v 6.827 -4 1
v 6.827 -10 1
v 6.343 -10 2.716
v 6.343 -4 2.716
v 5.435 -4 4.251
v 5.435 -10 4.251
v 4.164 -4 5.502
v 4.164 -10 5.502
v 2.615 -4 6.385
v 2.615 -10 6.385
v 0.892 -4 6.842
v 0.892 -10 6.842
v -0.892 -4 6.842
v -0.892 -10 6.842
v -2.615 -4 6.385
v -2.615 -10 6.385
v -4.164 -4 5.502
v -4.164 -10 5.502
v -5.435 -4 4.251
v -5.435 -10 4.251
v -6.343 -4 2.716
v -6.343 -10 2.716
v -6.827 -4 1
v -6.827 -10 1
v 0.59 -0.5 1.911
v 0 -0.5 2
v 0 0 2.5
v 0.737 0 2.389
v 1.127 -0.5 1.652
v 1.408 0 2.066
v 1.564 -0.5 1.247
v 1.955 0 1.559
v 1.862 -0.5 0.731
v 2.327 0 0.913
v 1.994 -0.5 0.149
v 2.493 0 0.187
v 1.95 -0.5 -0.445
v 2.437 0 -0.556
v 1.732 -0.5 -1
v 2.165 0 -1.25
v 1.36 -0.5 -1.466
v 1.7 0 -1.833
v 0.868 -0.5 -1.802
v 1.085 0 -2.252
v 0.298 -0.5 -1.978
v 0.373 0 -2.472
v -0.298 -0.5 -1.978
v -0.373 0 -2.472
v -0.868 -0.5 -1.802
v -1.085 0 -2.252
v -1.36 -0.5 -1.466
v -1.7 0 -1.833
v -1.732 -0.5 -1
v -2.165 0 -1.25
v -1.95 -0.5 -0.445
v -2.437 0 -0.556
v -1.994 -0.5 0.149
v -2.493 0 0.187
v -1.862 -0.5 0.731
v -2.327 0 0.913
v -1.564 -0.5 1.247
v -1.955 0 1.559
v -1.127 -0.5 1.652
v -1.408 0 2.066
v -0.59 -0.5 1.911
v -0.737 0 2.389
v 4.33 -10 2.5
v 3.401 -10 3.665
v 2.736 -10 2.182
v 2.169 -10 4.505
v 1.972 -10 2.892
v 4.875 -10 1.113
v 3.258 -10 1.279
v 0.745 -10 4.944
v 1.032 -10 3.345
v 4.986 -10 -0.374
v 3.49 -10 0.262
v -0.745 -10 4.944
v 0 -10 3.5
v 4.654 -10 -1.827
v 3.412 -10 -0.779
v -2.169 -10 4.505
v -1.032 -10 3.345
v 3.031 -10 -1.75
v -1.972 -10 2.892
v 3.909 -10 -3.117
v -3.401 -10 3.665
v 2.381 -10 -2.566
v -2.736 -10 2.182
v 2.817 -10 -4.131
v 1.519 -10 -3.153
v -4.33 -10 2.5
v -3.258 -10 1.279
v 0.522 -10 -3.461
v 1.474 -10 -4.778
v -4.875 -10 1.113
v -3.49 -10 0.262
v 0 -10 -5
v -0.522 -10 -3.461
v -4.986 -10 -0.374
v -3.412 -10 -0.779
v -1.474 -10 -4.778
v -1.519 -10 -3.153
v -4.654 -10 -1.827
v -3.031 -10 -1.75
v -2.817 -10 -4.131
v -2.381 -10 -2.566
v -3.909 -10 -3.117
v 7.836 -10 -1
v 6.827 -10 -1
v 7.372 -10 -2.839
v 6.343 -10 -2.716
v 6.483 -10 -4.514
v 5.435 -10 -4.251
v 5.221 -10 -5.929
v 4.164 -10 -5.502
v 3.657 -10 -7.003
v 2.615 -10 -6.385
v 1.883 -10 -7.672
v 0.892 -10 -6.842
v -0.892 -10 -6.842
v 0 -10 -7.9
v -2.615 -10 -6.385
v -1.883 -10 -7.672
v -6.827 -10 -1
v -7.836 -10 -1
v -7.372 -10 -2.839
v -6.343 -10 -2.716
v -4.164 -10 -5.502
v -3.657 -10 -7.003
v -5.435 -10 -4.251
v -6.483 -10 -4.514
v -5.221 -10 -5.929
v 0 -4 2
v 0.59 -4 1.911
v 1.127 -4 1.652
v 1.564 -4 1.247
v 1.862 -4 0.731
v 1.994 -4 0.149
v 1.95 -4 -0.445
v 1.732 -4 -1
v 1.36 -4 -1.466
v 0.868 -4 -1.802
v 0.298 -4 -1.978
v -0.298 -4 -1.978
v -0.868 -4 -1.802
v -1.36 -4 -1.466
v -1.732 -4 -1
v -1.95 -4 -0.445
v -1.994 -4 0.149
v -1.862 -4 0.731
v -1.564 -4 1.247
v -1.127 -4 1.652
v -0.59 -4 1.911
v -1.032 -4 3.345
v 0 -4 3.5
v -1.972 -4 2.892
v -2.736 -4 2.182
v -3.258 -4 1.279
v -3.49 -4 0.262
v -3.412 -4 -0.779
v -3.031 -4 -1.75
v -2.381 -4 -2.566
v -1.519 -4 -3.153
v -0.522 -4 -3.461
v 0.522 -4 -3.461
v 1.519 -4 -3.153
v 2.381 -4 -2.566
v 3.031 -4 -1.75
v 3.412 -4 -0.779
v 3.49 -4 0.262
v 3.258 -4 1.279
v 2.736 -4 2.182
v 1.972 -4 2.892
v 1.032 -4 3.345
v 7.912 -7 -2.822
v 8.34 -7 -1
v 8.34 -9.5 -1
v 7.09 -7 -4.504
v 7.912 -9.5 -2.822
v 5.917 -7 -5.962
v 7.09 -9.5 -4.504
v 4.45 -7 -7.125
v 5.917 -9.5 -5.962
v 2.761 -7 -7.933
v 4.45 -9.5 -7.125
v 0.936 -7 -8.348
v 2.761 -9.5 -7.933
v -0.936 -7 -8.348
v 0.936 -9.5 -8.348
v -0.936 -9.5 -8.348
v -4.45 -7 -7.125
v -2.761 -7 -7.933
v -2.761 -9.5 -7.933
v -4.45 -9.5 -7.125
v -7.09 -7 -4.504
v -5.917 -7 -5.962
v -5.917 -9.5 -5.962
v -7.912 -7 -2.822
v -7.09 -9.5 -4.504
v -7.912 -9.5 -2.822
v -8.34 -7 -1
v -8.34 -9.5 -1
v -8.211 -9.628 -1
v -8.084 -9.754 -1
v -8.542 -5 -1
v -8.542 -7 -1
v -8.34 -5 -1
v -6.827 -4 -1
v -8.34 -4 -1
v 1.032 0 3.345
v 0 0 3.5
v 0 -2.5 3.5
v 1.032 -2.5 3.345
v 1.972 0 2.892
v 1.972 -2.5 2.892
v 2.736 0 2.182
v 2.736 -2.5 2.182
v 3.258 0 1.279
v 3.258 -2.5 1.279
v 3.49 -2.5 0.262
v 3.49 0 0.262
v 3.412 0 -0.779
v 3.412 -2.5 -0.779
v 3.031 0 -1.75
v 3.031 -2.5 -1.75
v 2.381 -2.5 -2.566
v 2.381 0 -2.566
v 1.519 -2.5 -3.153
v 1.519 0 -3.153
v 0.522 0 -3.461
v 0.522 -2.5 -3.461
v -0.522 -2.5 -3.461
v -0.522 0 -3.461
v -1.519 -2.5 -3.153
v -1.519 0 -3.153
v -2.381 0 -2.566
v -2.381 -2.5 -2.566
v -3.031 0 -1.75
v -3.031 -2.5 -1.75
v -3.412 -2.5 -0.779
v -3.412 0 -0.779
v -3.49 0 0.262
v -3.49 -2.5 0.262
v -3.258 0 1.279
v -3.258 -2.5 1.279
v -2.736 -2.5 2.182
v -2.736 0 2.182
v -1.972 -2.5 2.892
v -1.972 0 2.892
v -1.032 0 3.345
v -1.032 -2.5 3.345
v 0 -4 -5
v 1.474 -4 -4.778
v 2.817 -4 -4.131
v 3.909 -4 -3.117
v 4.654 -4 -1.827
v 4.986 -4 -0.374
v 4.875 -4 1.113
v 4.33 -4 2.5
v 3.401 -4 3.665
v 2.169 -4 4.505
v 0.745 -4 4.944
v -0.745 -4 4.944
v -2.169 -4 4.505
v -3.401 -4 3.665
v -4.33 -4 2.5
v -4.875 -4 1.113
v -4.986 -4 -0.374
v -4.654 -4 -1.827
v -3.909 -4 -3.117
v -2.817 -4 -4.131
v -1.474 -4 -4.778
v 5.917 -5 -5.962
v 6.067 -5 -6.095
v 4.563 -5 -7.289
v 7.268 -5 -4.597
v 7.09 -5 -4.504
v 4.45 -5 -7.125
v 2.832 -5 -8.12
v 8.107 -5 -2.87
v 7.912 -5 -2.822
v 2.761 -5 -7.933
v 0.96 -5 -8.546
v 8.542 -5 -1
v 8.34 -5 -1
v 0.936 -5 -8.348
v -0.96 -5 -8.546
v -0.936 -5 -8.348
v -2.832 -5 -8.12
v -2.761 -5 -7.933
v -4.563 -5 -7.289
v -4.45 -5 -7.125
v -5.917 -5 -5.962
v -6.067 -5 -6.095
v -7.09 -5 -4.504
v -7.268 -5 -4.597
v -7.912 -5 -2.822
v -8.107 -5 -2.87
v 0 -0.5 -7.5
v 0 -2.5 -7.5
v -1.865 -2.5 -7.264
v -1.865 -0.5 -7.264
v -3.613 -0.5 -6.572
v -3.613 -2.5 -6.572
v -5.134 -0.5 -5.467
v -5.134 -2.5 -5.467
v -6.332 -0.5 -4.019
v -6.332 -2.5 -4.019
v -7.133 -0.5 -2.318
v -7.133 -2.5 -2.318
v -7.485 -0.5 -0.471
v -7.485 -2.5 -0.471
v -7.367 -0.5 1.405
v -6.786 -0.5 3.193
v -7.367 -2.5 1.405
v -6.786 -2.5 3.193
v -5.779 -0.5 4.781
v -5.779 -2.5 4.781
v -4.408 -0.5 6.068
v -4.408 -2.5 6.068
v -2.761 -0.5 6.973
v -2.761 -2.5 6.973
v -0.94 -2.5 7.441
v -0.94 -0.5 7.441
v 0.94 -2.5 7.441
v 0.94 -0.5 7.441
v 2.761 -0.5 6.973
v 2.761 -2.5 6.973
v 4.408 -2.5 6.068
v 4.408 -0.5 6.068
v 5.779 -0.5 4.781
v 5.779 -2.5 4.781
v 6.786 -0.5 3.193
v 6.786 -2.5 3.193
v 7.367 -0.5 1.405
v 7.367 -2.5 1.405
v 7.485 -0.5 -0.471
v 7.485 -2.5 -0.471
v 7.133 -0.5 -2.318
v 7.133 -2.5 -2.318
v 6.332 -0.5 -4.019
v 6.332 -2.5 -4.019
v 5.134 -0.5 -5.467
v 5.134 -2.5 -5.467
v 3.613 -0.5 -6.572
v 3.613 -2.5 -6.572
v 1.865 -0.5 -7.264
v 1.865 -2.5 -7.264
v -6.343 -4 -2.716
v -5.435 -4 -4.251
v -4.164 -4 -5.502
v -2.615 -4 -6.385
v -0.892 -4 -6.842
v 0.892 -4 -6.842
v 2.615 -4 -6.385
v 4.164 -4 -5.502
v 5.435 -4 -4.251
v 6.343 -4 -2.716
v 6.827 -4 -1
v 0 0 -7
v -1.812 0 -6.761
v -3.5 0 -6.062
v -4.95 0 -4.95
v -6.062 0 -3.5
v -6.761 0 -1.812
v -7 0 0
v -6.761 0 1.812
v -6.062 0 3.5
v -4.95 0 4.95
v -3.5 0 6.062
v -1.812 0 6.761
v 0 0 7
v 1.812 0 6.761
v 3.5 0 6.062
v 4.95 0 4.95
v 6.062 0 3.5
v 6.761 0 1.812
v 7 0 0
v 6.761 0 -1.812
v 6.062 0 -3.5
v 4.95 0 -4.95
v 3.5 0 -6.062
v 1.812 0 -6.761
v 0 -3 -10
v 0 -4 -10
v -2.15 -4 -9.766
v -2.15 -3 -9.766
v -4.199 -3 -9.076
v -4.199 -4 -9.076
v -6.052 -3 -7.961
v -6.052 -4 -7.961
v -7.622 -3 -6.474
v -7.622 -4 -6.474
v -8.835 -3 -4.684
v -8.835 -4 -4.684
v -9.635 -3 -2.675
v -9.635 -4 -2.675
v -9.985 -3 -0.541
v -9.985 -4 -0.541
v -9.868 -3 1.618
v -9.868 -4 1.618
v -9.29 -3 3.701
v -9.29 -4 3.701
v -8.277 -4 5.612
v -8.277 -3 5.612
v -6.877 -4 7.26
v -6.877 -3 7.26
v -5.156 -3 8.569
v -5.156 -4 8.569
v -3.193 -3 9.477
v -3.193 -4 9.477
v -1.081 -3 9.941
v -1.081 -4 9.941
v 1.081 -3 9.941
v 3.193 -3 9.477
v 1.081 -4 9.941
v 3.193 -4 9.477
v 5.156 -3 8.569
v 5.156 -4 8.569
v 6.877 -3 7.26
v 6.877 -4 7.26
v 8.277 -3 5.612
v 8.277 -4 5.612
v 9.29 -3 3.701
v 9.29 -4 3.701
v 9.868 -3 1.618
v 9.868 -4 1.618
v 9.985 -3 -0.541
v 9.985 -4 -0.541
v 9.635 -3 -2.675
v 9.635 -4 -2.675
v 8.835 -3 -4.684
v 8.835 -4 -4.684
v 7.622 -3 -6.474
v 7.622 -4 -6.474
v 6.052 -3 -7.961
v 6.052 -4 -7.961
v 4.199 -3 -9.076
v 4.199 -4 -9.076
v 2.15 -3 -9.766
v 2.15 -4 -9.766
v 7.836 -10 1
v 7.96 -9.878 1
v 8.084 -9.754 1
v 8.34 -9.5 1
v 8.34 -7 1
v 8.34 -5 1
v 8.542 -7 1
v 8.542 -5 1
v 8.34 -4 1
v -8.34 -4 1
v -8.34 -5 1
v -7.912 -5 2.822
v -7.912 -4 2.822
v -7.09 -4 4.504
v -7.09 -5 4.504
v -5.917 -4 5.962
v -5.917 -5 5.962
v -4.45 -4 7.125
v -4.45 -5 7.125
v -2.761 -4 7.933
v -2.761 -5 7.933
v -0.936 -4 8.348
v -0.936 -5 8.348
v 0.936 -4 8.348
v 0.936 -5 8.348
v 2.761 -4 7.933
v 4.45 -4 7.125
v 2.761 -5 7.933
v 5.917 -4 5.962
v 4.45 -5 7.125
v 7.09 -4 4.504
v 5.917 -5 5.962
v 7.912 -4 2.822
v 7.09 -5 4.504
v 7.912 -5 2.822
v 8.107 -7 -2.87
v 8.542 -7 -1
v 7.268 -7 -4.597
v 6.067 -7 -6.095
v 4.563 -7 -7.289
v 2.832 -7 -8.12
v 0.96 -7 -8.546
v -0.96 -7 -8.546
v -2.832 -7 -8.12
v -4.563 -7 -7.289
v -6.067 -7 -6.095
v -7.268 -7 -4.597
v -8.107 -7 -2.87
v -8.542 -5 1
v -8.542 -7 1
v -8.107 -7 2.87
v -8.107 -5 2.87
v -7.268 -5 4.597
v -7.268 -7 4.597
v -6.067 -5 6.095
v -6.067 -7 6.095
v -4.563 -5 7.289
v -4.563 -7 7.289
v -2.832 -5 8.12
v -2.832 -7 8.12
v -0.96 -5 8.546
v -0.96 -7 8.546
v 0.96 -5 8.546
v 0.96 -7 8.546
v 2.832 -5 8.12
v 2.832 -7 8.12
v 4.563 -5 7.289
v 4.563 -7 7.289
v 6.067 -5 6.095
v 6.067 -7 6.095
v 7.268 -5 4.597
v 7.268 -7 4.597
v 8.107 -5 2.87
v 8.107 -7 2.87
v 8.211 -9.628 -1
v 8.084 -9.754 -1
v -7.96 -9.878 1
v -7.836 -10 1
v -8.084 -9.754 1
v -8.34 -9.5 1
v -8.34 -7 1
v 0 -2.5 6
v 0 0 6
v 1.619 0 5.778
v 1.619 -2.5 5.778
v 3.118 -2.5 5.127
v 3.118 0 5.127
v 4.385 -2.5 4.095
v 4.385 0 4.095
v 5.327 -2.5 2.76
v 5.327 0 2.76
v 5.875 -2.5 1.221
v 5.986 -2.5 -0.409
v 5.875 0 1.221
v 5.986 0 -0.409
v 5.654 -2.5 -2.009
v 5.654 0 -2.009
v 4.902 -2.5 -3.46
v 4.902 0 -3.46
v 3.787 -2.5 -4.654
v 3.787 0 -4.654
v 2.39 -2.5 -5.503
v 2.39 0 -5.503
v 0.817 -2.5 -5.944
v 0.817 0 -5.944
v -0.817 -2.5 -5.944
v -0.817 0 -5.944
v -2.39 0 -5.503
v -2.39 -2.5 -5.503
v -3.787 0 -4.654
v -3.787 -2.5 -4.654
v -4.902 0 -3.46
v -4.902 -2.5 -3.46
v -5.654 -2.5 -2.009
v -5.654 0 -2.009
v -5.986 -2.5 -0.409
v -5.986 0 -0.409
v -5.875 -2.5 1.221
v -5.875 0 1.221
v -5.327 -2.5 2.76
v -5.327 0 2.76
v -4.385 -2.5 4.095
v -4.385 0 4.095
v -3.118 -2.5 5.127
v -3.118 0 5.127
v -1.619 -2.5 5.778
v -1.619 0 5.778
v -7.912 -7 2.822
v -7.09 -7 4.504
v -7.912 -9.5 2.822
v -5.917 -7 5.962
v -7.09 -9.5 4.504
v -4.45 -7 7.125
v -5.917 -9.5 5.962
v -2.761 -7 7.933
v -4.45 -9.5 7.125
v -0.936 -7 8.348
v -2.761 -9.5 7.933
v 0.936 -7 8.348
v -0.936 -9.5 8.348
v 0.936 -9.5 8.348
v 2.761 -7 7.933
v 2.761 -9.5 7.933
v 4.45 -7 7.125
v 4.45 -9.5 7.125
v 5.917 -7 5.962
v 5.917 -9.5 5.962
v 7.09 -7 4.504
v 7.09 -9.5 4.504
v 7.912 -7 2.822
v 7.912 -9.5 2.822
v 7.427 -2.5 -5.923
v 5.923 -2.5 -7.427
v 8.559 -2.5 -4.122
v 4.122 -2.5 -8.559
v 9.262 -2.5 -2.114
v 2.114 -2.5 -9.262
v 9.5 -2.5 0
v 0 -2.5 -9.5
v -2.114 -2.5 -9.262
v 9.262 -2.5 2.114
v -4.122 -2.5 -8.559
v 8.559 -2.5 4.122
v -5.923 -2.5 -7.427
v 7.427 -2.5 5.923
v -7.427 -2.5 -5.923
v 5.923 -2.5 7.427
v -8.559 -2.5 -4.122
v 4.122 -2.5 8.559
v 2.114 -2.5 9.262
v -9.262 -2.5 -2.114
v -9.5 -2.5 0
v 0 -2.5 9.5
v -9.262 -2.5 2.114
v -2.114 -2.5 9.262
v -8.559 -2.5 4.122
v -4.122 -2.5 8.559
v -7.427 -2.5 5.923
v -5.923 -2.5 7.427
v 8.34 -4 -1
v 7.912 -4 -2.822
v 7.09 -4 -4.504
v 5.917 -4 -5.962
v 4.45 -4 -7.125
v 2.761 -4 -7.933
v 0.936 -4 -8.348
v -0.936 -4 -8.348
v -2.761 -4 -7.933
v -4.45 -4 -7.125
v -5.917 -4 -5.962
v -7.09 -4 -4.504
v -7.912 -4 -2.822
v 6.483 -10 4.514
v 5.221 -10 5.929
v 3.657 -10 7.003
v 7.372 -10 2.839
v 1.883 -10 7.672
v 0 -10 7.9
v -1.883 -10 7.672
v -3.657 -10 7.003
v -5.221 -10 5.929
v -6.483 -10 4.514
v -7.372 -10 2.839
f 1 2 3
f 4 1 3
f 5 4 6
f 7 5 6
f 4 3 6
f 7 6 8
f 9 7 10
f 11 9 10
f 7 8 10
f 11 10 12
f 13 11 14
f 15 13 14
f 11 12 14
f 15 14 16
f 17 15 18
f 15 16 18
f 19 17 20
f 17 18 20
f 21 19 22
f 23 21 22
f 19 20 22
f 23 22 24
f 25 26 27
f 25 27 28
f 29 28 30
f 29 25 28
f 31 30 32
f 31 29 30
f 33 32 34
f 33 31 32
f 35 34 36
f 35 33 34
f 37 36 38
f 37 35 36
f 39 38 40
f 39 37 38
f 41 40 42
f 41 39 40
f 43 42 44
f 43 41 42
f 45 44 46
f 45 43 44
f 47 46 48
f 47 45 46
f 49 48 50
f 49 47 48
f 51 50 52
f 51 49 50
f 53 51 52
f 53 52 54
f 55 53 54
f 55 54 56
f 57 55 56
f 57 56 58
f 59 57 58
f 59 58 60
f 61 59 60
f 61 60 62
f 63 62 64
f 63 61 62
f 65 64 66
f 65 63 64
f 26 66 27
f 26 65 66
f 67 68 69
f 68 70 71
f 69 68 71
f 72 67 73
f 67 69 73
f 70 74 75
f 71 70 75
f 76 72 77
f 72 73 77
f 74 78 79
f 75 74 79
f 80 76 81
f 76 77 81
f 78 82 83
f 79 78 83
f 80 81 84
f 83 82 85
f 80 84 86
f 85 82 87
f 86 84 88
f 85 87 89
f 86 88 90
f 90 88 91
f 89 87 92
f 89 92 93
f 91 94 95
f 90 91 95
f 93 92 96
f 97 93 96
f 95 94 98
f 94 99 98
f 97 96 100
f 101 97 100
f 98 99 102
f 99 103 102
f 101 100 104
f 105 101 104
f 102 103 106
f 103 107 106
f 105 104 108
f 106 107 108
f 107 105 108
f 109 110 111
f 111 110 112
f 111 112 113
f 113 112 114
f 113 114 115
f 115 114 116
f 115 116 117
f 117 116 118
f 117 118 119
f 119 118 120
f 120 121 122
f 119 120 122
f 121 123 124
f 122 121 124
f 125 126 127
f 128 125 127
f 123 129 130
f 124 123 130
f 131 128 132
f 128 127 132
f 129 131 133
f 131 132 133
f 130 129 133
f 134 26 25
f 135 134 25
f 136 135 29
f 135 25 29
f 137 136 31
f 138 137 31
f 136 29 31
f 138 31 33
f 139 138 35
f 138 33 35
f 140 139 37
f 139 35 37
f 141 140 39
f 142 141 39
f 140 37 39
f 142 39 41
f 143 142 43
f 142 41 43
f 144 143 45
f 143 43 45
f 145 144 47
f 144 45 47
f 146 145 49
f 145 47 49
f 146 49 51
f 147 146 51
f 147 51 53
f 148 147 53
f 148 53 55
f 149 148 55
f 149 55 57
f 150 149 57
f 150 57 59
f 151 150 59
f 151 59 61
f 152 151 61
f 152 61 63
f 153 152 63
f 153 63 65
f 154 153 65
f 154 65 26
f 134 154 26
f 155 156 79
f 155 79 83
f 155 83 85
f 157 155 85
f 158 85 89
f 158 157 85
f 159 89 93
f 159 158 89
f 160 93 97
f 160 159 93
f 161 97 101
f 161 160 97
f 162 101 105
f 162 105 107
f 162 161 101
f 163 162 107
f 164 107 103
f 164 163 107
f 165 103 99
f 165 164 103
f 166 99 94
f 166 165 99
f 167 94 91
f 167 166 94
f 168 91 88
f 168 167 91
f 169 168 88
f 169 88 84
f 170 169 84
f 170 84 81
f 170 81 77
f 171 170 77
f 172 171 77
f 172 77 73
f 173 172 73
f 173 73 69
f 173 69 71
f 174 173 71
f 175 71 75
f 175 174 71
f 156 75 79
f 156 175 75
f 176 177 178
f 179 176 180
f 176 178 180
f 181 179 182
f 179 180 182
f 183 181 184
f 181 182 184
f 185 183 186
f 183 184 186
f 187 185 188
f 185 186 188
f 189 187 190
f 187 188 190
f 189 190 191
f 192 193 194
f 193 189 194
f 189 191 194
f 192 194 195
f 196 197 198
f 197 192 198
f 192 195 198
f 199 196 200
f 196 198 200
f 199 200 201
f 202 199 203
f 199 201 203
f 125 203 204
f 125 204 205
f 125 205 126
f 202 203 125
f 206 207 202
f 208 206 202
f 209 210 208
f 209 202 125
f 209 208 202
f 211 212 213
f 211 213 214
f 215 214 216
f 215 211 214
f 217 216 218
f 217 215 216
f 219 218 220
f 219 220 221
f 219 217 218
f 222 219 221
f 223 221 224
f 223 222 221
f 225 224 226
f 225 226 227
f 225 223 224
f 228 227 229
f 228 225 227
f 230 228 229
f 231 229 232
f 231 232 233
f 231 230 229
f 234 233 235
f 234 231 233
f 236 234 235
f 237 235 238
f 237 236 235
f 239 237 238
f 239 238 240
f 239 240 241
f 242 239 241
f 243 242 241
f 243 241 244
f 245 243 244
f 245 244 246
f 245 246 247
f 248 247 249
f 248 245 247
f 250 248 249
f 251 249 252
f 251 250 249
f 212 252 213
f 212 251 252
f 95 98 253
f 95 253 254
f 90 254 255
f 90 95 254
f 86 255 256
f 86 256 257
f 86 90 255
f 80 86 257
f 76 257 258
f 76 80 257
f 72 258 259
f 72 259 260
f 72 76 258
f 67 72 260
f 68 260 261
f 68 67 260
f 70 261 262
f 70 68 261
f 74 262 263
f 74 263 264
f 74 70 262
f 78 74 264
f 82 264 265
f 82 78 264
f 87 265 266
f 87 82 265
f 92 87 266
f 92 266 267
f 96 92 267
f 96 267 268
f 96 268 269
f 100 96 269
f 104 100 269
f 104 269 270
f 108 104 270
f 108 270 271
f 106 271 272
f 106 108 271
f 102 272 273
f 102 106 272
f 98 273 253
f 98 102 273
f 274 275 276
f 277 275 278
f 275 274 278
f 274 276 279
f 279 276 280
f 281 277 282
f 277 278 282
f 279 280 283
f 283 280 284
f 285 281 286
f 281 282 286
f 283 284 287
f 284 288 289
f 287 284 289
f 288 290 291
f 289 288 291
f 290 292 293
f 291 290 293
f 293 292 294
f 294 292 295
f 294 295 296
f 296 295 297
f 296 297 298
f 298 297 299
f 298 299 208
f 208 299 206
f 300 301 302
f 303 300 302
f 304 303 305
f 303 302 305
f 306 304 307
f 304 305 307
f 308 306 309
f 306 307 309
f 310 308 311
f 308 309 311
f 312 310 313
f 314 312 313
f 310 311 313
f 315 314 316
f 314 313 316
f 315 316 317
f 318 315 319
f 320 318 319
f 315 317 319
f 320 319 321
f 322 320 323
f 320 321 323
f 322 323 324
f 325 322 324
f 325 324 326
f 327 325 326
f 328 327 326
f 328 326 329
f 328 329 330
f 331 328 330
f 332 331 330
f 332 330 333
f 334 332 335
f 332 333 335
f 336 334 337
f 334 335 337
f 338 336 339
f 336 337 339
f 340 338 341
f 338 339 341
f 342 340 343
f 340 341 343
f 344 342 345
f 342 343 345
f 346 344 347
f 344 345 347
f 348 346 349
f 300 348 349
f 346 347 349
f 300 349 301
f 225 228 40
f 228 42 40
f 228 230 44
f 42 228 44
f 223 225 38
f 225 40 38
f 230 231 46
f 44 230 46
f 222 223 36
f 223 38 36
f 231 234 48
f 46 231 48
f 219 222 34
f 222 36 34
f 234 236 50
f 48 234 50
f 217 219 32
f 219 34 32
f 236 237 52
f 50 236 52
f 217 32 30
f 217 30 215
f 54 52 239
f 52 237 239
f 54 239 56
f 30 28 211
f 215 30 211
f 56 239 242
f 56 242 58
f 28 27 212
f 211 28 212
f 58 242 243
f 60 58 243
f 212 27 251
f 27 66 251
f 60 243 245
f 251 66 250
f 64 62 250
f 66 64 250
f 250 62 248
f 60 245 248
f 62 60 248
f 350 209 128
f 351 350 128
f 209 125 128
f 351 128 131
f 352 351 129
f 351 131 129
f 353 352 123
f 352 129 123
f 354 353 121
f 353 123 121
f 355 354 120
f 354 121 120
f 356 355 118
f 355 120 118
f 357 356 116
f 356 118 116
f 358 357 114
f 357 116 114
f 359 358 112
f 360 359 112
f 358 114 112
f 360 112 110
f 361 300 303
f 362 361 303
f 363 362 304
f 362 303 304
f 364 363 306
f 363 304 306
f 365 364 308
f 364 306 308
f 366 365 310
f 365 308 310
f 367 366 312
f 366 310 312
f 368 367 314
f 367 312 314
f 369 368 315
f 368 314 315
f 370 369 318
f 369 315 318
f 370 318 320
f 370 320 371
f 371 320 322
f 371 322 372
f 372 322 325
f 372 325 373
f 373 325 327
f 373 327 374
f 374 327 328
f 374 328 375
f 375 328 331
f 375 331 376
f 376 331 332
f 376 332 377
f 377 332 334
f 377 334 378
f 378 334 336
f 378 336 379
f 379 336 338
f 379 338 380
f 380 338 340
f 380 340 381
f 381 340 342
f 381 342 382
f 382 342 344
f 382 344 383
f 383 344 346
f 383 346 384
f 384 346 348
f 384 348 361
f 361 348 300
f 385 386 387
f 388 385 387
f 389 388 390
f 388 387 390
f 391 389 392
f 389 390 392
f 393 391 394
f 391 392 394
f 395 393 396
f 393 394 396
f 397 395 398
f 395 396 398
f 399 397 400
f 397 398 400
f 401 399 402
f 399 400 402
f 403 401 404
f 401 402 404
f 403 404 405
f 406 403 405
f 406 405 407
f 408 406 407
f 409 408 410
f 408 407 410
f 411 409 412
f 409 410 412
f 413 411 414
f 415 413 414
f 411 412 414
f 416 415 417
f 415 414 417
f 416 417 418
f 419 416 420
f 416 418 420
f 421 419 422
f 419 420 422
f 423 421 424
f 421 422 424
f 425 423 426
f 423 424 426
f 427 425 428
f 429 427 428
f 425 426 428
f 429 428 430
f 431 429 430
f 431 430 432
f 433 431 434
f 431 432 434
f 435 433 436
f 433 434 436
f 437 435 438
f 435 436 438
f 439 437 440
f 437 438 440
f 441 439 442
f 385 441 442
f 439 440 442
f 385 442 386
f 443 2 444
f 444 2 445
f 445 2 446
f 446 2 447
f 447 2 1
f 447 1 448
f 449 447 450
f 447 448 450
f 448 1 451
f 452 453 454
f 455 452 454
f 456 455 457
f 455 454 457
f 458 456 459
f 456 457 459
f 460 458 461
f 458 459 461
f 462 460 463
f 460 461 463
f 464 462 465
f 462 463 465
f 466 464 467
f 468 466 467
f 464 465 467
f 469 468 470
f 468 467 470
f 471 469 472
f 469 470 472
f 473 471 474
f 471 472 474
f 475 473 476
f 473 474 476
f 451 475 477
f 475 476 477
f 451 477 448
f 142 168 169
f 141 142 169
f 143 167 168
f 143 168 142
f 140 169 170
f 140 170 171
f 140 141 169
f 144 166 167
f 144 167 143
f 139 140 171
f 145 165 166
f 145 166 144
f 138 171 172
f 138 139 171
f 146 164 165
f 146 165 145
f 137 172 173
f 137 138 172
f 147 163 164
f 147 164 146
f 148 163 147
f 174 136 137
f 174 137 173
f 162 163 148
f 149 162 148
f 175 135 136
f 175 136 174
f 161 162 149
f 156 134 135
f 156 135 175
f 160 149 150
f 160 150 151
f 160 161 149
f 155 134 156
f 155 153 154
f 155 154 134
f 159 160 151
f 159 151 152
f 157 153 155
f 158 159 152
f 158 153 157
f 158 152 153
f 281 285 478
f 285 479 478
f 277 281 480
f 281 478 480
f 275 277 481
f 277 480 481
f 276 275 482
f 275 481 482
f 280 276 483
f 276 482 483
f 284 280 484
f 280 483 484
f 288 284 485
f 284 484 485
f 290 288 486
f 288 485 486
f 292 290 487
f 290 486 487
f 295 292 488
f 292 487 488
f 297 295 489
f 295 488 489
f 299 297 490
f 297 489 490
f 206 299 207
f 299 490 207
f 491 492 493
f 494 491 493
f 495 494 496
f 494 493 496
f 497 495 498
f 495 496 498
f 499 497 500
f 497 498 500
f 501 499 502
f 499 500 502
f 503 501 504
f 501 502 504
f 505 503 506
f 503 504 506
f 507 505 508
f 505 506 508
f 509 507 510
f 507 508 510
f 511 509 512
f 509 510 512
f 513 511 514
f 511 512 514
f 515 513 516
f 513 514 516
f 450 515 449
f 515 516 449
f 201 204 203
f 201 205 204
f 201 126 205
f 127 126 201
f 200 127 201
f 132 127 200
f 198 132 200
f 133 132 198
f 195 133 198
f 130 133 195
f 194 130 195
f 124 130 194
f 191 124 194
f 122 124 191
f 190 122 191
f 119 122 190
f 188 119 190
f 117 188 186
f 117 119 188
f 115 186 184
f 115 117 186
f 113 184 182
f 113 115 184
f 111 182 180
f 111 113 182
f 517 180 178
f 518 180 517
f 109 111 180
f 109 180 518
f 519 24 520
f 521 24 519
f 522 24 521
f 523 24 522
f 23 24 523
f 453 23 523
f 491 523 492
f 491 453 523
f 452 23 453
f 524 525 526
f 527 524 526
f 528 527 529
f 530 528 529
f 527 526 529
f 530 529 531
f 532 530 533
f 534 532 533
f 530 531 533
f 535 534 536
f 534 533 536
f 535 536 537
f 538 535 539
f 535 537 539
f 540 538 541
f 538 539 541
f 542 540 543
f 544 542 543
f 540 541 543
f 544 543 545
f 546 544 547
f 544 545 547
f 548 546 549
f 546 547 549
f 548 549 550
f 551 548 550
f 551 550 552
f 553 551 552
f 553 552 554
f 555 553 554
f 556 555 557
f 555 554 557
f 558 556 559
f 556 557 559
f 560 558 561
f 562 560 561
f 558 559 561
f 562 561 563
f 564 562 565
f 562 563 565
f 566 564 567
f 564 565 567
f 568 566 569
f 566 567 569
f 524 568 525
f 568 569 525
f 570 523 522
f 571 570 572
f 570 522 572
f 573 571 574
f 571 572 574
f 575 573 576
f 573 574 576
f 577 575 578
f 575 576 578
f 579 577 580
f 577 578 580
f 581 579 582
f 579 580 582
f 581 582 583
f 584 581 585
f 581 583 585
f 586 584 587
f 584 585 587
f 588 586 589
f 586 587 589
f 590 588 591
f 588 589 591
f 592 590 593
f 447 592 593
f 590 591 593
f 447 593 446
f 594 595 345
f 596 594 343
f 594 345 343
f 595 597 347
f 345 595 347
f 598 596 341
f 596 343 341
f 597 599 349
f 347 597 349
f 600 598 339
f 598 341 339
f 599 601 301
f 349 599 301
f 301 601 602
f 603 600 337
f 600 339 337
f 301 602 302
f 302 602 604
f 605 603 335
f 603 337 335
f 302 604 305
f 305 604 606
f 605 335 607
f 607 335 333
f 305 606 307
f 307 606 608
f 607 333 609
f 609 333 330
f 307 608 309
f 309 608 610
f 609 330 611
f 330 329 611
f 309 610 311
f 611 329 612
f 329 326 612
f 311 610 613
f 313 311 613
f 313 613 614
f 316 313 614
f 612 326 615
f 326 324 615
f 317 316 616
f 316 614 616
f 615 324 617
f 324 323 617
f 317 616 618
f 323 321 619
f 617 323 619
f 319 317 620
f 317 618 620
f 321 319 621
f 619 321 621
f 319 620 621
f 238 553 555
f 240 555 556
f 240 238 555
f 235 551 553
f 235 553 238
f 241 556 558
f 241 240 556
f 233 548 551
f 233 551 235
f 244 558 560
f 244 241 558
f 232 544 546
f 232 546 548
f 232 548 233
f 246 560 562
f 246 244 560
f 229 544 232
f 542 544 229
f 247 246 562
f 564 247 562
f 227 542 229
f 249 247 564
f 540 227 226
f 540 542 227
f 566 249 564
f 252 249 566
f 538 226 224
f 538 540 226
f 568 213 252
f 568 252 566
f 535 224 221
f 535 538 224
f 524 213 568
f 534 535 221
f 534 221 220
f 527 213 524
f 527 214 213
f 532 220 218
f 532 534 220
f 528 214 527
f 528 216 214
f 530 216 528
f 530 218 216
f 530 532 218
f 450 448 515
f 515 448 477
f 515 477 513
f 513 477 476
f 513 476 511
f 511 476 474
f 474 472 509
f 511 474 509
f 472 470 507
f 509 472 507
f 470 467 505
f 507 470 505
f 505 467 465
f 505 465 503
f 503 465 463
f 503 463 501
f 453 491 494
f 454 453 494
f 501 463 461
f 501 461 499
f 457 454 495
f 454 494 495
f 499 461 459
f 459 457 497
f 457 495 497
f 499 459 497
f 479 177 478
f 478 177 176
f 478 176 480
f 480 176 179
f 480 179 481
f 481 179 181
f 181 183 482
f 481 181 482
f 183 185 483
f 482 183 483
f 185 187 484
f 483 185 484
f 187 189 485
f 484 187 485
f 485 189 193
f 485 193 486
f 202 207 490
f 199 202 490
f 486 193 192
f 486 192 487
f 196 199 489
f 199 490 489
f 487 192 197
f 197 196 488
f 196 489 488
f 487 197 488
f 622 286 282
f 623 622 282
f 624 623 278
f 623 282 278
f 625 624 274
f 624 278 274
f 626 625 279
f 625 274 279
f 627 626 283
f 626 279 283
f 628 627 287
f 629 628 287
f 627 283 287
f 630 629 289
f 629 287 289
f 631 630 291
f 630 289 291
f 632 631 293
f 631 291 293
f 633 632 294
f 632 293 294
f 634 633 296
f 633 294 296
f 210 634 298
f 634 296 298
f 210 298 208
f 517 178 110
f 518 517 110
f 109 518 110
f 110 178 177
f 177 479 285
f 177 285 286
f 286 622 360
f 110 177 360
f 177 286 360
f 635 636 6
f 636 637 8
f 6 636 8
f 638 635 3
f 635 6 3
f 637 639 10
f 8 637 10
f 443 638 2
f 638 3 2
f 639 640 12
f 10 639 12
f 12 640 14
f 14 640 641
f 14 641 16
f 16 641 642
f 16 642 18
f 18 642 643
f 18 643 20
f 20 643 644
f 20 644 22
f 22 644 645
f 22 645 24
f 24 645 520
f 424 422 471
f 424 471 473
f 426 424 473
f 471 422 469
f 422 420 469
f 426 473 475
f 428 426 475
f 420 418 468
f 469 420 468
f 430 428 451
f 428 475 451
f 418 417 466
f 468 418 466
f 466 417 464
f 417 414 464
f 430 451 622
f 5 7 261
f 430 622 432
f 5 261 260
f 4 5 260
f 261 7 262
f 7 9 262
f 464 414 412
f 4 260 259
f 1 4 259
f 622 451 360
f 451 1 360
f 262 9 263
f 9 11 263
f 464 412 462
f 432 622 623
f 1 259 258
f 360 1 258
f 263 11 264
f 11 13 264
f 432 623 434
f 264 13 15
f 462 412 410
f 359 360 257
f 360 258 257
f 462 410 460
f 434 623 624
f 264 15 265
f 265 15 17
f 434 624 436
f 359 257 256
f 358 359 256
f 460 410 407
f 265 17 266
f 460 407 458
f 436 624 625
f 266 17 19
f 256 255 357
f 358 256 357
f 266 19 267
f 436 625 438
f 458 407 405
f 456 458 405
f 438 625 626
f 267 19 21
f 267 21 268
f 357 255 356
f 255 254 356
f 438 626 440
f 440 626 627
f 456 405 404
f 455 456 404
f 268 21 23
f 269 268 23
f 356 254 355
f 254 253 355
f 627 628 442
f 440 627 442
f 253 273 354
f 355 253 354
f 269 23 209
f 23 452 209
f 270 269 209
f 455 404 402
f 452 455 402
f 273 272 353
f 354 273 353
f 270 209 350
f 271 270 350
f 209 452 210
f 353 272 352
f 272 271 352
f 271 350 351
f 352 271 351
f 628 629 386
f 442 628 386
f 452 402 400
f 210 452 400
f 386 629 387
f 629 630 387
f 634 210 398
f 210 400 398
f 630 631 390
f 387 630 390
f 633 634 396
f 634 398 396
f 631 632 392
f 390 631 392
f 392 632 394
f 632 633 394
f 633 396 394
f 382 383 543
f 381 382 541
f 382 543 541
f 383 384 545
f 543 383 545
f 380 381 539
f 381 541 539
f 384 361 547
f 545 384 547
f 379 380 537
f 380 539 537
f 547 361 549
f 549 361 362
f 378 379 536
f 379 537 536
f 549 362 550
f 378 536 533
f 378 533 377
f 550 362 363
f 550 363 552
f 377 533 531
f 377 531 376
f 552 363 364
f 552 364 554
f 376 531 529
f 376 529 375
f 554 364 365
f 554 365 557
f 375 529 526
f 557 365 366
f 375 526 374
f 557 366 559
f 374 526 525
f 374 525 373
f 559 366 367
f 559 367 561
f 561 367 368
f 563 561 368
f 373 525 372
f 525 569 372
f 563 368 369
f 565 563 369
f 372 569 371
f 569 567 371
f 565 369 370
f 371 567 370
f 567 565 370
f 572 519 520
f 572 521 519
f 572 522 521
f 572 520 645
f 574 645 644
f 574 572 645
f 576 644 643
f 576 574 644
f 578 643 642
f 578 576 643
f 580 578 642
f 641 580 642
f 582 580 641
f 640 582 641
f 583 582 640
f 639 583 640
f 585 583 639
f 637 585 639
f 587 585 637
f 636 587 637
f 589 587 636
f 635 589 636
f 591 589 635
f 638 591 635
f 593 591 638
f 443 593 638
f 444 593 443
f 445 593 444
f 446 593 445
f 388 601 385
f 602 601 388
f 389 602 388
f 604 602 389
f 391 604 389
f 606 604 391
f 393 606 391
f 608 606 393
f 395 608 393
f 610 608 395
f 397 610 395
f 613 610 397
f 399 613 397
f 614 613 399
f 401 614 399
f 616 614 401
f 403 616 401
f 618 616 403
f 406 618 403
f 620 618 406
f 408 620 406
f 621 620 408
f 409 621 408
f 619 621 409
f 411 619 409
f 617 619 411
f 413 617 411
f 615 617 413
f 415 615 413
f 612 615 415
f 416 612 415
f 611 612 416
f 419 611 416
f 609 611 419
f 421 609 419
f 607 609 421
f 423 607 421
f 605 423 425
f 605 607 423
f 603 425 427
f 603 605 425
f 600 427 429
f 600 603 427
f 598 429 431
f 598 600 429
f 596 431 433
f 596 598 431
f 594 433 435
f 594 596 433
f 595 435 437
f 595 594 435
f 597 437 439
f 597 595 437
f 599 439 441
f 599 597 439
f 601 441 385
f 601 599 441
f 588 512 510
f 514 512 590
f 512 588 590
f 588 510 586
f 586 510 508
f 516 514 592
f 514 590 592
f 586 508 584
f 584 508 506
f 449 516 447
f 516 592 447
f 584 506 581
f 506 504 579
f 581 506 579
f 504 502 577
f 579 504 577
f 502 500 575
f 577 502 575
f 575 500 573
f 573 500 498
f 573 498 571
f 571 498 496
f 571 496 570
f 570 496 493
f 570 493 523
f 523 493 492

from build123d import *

# Parameters (mm, degrees)
SKETCH_2_R          = 6
SKETCH_2_R_2        = 3.5
CUT_EXTRUDE_1_DEPTH = 2.5
SKETCH_3_R          = 6.9
SKETCH_3_R_2        = 5
CUT_EXTRUDE_2_DEPTH = 6
CUT_EXTRUDE_START   = -6
SKETCH_4_R          = 3.5
CUT_EXTRUDE_3_DEPTH = 6
CUT_EXTRUDE_4_REACH = 19.321
SKETCH_5_R          = 2
CUT_EXTRUDE_5_DEPTH = 6
CHAMFER_1_SIZE      = 0.5


with BuildPart() as part:
    # 草图1 → 旋转1 (revolve)
    with BuildSketch(Plane.XY, mode=Mode.PRIVATE) as revolve_1_sk:
        Polygon((0, 0), (7.5, 0), (7.5, -2.5), (10, -2.5), (10, -4), (8.4, -4), (8.4, -5), (8.6, -5), (8.6, -7), (8.4, -7), (8.4, -10), (0, -10), align=None)
    revolve(revolve_1_sk.sketch.rotate(Axis((0, -10, 0), (0, 1, 0)), 90), axis=Axis((0, -10, 0), (0, 1, 0)))

    # 草图2 → 切除-拉伸1 (cut)
    with BuildSketch(Plane(origin=(0, 0, 0), x_dir=(1, 0, 0), z_dir=(0, 1, 0))):
        with Locations(Location((0, 0, 0), (0, 0, 270))):
            Circle(SKETCH_2_R)
        with Locations(Location((0, 0, 0), (0, 0, 270))):
            Circle(SKETCH_2_R_2, mode=Mode.SUBTRACT)
    extrude(amount=-CUT_EXTRUDE_1_DEPTH, mode=Mode.SUBTRACT)

    # 草图3 → 切除-拉伸2 (cut)
    with BuildSketch(Plane.XZ.offset(10)):
        with Locations(Location((0, 0, 0), (0, 0, 270))):
            Circle(SKETCH_3_R)
        with Locations(Location((0, 0, 0), (0, 0, 270))):
            Circle(SKETCH_3_R_2, mode=Mode.SUBTRACT)
    extrude(amount=-CUT_EXTRUDE_2_DEPTH, mode=Mode.SUBTRACT)

    # 草图4 → 切除-拉伸3 (cut)
    with BuildSketch(Plane.XZ.offset(10).offset(CUT_EXTRUDE_START)):
        with Locations(Location((0, 0, 0), (0, 0, 90))):
            Circle(SKETCH_4_R)
    extrude(amount=CUT_EXTRUDE_3_DEPTH, mode=Mode.SUBTRACT)

    # 草图5 → 切除-拉伸4 (cut, up to next)
    with BuildSketch(Plane(origin=(0, 0, 0), x_dir=(1, 0, 0), z_dir=(0, 1, 0)), mode=Mode.PRIVATE) as cut_extrude_4_sk1:
        with Locations(Location((0, 0, 0), (0, 0, 270))):
            Circle(SKETCH_5_R)
    cut_extrude_4_tool1 = extrude(cut_extrude_4_sk1.sketch, amount=-CUT_EXTRUDE_4_REACH, mode=Mode.PRIVATE) & part.part
    add(cut_extrude_4_tool1.solids().sort_by_distance((0, 0, 0))[0], mode=Mode.SUBTRACT)

    # 草图6 → 切除-拉伸5 (cut)
    with BuildSketch(Plane.XZ.offset(10).offset(CUT_EXTRUDE_START)):
        with BuildLine():
            Line((-8.94427191, -1), (-5.916079783, -1))
            ThreePointArc((-5.916079783, -1), (-6, 0), (-5.916079783, 1))
            Line((-5.916079783, 1), (-8.94427191, 1))
            ThreePointArc((-8.94427191, 1), (-9, 0), (-8.94427191, -1))
        make_face()
        with BuildLine():
            Line((5.916079783, 1), (8.94427191, 1))
            ThreePointArc((8.94427191, 1), (9, 0), (8.94427191, -1))
            Line((8.94427191, -1), (5.916079783, -1))
            ThreePointArc((5.916079783, -1), (6, 0), (5.916079783, 1))
        make_face()
    extrude(amount=CUT_EXTRUDE_5_DEPTH, mode=Mode.SUBTRACT)

    # 倒角1
    chamfer_1_edges = [part.edges().sort_by_distance(p)[0] for p in [
        (0, -2.5, 10),
        (0, 0, 7.5),
        (0, 0, -2),
        (0, -10, -8.4),
        (0, -10, 8.4),
    ]]
    chamfer(chamfer_1_edges, length=CHAMFER_1_SIZE)


solid = part.part
